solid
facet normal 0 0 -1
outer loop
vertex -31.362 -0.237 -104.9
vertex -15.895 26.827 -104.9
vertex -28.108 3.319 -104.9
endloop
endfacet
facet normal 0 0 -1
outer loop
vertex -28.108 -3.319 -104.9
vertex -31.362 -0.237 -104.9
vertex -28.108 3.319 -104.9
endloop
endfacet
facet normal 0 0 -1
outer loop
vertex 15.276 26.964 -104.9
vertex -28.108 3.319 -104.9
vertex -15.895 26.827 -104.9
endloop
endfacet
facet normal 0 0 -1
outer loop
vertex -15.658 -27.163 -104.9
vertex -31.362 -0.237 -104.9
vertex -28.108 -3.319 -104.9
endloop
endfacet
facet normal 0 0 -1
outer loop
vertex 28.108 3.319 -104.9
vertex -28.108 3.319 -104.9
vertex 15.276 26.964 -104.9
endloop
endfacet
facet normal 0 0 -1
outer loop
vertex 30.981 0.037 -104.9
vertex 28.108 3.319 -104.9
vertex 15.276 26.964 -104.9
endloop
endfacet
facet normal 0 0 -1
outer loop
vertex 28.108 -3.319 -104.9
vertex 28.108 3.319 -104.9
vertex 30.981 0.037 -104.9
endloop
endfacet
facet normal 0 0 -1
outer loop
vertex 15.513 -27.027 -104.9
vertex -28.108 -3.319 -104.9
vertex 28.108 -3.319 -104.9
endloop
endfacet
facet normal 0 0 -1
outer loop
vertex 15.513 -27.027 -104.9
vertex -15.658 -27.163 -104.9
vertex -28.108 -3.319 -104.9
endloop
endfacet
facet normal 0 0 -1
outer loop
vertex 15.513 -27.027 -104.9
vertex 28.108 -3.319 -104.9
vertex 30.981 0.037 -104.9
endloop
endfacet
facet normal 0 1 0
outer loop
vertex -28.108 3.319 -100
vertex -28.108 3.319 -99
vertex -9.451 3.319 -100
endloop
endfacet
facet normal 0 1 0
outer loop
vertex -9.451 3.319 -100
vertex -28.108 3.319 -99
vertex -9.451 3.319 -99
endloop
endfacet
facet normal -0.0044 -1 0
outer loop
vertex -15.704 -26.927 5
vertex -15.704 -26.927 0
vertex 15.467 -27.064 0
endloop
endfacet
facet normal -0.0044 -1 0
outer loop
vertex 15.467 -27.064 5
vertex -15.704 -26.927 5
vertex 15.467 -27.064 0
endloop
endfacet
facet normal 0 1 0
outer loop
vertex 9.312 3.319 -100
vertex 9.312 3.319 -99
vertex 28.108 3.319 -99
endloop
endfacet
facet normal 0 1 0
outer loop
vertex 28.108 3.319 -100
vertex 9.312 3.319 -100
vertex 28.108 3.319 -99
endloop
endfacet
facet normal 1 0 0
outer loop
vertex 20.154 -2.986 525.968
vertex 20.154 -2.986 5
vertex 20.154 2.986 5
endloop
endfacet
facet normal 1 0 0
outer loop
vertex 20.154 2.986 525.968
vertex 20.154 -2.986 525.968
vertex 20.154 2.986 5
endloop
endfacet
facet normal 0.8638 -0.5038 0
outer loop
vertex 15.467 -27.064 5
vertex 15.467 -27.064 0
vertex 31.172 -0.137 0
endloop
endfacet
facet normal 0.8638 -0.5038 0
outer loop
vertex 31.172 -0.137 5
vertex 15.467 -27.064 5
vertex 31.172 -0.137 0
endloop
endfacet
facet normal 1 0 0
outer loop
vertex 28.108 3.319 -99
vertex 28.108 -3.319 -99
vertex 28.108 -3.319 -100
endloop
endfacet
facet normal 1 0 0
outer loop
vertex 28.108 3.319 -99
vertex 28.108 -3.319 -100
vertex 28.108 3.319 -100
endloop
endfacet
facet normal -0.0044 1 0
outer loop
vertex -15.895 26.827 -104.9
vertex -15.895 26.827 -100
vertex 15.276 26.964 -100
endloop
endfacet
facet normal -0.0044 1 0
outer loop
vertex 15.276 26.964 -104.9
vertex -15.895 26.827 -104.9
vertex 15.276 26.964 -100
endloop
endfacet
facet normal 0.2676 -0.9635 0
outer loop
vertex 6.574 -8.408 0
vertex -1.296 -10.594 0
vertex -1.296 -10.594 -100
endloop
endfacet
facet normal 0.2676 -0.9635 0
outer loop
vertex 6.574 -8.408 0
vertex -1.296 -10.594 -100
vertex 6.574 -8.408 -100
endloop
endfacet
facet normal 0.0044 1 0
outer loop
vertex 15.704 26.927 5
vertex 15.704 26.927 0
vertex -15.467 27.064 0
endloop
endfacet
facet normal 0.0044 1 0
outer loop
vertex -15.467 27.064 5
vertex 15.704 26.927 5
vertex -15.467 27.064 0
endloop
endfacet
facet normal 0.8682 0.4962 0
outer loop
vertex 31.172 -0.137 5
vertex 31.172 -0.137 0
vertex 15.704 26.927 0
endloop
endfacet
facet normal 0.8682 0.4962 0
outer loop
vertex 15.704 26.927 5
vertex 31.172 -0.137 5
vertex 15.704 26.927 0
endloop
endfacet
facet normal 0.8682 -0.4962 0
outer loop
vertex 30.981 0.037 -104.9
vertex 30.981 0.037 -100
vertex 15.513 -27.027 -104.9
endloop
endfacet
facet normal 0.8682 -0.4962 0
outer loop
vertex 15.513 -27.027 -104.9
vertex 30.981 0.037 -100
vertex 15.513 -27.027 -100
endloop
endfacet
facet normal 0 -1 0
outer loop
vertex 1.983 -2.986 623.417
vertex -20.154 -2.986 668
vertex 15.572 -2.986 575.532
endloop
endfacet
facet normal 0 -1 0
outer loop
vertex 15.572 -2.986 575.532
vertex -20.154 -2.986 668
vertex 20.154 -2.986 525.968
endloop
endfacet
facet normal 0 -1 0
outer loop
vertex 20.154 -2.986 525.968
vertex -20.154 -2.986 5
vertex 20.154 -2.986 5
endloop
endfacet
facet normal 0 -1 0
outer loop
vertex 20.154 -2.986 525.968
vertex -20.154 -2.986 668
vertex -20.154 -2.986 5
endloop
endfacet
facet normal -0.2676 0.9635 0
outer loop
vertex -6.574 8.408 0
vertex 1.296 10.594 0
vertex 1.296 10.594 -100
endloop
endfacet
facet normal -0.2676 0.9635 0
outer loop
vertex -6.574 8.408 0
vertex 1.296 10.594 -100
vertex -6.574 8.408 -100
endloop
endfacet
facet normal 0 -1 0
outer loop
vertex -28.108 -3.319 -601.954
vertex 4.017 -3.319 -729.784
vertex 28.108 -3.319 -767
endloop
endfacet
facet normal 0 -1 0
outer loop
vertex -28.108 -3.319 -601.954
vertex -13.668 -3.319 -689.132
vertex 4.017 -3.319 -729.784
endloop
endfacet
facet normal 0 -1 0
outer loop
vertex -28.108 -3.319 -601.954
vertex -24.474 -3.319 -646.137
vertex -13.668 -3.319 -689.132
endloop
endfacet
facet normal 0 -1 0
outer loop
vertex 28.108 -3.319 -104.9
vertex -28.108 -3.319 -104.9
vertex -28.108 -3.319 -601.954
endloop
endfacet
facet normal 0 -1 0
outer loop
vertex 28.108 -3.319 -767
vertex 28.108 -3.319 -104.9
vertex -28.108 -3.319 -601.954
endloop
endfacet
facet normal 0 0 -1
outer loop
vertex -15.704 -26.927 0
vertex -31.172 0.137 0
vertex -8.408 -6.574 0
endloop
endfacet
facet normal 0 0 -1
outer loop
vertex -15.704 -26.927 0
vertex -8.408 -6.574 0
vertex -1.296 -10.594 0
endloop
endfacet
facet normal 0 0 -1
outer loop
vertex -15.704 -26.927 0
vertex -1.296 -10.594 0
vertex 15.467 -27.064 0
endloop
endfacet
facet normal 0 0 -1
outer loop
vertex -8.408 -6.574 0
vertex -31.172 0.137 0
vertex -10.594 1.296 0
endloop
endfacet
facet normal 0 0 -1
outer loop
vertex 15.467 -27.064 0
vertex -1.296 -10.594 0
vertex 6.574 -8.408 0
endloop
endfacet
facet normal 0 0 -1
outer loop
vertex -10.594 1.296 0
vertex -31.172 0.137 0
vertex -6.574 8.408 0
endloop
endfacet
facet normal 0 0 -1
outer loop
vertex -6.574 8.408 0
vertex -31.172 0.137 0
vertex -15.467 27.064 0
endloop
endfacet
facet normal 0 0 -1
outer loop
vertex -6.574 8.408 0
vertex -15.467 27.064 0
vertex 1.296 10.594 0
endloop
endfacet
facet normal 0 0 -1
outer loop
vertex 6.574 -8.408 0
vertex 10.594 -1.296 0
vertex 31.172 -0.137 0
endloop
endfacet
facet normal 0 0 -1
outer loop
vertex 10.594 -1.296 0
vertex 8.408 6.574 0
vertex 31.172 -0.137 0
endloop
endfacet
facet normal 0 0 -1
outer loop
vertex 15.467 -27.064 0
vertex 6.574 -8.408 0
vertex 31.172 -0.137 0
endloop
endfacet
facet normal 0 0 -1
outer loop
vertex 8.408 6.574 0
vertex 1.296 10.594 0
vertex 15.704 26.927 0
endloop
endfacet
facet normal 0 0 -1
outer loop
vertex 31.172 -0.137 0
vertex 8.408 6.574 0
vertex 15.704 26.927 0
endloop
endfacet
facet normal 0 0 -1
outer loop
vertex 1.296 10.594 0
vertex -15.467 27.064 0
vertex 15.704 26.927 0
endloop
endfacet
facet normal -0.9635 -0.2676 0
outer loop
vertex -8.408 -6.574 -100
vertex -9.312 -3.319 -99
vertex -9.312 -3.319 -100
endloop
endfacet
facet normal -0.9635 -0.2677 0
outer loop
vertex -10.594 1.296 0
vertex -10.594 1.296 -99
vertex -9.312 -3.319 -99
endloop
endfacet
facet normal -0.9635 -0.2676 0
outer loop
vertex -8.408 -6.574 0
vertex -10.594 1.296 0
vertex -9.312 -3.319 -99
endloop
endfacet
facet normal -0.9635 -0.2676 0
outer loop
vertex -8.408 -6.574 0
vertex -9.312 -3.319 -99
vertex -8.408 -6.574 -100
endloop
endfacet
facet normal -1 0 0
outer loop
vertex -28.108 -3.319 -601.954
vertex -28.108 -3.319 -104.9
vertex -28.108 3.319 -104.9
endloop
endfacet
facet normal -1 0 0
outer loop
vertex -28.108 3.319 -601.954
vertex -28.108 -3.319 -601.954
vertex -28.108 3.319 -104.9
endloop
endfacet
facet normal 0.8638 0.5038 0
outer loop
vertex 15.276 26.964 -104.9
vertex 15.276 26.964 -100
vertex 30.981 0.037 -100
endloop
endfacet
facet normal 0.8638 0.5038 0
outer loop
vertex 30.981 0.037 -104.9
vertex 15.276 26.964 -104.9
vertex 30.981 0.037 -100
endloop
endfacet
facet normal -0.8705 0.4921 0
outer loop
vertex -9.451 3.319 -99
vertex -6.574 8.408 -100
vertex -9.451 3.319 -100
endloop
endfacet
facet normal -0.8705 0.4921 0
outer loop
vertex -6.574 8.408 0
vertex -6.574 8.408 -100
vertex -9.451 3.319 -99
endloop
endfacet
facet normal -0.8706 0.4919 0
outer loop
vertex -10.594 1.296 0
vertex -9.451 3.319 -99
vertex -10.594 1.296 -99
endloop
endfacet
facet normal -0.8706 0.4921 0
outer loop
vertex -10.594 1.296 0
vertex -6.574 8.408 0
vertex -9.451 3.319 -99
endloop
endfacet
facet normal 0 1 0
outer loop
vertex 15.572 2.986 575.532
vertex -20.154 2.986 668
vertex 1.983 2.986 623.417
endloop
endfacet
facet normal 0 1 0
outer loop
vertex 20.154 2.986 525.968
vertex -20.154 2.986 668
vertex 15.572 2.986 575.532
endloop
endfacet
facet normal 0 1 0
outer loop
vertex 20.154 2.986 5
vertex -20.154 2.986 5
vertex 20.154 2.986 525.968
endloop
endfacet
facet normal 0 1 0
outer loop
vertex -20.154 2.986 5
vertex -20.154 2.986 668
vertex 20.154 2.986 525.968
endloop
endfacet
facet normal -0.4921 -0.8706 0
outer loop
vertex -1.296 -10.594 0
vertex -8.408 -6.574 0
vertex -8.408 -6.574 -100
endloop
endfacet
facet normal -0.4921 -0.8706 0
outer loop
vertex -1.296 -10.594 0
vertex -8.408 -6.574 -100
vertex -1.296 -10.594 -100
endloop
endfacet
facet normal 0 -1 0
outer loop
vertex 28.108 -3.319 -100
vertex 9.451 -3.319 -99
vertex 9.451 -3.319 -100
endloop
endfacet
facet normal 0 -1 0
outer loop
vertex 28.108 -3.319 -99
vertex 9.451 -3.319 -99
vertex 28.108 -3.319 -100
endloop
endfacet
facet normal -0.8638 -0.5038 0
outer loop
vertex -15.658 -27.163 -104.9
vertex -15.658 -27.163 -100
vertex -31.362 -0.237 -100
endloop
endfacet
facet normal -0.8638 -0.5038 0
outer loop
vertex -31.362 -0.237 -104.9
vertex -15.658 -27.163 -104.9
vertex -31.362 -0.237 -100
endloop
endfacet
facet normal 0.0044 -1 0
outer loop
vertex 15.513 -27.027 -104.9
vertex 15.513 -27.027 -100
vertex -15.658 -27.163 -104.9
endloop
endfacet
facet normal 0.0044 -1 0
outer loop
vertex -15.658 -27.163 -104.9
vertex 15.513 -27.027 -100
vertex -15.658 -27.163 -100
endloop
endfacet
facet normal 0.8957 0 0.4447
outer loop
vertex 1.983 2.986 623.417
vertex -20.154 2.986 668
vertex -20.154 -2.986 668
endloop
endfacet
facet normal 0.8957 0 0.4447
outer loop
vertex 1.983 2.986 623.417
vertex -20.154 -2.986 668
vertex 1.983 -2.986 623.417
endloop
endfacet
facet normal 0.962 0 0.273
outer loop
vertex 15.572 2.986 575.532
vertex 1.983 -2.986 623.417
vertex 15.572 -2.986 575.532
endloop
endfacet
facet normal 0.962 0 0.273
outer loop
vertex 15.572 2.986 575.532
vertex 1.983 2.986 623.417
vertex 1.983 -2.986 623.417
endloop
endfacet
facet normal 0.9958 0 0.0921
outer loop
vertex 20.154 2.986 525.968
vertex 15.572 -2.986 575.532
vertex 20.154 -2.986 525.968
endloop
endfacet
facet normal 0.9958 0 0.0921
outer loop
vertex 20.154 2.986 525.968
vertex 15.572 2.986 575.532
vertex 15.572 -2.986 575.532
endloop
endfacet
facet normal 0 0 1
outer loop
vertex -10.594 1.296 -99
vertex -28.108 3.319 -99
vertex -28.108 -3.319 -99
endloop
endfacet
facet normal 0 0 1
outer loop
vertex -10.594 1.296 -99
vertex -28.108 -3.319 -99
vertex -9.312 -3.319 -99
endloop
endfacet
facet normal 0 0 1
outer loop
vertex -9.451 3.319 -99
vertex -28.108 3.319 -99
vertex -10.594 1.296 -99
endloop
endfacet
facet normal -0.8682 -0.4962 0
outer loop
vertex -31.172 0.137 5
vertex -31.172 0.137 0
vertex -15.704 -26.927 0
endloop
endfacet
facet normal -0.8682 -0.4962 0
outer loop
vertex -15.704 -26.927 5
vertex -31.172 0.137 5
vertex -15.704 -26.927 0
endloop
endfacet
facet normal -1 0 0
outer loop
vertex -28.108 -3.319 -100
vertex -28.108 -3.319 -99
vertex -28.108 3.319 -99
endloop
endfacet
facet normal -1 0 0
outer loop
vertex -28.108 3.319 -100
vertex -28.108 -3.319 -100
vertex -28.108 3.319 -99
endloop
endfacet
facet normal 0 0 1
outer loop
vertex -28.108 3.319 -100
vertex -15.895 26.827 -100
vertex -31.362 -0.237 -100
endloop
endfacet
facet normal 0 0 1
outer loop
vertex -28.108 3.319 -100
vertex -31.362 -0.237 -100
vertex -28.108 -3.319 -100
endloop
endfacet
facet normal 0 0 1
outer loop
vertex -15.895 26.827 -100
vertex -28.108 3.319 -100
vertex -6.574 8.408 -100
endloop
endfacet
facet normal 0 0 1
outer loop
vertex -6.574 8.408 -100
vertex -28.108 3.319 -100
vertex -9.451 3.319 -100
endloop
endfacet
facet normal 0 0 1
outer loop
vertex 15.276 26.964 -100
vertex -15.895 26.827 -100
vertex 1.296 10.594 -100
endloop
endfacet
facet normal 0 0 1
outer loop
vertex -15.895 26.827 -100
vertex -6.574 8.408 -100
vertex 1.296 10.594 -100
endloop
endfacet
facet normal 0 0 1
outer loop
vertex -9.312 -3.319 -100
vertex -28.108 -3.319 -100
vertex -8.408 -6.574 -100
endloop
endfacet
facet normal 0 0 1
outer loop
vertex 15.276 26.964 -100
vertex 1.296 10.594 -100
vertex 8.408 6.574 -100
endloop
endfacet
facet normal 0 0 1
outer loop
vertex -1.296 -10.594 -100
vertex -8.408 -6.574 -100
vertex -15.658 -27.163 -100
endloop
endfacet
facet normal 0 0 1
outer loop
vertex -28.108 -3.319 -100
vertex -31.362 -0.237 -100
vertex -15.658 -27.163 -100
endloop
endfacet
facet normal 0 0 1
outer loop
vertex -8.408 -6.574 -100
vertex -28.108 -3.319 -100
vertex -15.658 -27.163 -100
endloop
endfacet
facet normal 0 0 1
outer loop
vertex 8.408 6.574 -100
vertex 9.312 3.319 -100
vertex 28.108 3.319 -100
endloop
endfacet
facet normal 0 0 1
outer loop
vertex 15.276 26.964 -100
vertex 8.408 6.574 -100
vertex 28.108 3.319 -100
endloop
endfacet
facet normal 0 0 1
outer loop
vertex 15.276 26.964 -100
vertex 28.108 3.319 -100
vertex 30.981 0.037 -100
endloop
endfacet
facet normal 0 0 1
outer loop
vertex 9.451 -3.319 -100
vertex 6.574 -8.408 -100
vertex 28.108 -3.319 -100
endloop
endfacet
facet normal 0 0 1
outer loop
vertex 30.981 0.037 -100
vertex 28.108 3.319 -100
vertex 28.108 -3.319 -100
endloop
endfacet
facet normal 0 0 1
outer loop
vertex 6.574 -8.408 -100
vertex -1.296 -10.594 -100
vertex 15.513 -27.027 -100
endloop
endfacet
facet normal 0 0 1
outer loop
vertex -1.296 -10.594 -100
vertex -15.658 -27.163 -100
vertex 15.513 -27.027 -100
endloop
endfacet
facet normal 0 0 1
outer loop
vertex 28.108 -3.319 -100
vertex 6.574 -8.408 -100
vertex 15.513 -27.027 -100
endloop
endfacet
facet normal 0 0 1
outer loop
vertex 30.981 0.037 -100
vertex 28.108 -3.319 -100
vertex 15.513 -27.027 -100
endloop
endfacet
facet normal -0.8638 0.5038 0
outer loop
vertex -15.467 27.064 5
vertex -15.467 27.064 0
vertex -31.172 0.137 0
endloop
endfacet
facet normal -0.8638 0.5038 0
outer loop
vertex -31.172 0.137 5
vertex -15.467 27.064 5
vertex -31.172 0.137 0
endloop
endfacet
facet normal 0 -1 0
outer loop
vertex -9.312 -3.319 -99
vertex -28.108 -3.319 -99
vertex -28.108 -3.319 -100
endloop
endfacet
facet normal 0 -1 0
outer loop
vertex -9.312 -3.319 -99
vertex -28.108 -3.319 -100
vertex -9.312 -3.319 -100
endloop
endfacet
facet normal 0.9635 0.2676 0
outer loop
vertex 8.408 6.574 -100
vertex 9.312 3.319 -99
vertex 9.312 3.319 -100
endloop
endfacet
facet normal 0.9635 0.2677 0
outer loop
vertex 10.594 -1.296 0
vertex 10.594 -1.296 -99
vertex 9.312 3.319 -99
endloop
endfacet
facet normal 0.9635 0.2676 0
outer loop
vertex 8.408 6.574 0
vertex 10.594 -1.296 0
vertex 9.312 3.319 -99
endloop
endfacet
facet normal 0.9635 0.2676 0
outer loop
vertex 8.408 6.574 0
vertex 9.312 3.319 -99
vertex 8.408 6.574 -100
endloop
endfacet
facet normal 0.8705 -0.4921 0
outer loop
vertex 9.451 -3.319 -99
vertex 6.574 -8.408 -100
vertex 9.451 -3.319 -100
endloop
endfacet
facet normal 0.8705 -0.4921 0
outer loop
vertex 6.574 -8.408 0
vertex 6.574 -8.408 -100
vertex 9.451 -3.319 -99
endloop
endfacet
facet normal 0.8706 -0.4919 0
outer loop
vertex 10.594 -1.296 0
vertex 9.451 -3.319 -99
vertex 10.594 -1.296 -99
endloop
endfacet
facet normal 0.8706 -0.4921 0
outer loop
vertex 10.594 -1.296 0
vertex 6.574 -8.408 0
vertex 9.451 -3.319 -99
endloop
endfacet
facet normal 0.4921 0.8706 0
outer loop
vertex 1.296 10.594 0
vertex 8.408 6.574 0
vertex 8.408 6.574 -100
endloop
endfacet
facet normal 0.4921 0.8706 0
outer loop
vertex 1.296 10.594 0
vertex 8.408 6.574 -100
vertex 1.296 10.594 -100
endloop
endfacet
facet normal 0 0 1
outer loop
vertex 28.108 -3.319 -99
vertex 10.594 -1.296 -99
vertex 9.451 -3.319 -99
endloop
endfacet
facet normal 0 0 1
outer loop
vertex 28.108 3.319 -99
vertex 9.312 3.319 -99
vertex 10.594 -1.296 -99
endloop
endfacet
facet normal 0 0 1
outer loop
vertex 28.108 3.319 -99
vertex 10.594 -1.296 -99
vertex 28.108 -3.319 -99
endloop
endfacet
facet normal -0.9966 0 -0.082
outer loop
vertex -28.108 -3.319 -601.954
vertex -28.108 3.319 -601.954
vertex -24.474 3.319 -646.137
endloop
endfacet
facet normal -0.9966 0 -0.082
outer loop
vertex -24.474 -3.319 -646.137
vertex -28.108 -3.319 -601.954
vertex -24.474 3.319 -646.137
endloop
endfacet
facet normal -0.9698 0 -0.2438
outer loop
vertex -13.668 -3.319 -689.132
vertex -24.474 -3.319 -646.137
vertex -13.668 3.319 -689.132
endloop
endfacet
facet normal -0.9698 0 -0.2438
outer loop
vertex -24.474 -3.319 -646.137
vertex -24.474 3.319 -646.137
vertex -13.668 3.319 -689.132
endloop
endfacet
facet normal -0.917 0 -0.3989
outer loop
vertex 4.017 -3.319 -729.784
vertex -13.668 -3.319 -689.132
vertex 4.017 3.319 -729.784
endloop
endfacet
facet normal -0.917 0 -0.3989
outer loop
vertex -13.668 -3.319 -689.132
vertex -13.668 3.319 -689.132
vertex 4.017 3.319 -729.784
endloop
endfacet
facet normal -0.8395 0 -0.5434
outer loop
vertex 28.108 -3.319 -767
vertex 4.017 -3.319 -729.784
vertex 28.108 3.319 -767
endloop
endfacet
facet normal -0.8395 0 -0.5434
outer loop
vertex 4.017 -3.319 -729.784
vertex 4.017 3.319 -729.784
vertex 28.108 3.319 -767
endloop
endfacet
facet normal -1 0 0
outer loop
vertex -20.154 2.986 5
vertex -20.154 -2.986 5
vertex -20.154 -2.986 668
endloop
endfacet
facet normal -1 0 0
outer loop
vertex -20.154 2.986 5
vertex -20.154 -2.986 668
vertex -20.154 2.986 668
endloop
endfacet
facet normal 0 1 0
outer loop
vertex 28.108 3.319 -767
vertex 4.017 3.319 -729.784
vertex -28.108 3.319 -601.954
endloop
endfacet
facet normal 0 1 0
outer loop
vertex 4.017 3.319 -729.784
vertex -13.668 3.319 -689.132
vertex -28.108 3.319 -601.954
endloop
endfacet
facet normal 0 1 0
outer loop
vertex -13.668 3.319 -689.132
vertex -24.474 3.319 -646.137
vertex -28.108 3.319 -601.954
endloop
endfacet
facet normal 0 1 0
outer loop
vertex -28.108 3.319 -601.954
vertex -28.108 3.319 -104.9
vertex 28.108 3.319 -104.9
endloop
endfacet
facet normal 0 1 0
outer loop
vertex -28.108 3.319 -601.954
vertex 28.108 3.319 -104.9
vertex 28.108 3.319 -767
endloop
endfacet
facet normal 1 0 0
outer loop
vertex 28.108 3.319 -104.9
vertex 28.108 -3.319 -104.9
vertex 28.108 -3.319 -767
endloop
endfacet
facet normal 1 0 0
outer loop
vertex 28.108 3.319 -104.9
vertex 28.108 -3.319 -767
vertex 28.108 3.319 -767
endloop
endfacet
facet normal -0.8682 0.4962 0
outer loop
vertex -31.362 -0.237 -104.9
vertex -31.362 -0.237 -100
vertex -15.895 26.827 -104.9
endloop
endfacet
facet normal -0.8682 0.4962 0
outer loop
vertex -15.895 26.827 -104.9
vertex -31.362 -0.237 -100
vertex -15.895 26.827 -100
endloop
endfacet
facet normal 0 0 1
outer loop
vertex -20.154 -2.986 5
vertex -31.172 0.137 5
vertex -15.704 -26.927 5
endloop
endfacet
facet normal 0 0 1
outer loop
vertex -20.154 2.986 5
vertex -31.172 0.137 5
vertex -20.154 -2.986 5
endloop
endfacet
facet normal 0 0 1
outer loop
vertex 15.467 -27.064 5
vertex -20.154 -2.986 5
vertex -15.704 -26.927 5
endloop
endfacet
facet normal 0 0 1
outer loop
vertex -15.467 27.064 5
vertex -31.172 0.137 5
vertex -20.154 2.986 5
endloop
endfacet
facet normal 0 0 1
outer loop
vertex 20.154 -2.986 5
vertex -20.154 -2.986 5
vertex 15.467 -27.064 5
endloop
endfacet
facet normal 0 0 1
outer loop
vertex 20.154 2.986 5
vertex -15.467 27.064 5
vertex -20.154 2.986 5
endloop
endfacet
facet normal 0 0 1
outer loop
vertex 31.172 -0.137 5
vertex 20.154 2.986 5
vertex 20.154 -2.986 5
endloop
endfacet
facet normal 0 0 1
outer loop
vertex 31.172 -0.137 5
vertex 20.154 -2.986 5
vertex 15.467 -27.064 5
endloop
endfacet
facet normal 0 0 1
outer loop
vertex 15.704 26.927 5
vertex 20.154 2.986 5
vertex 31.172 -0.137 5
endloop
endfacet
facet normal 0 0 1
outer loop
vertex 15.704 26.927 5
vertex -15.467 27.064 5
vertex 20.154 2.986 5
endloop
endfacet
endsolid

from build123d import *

# Parameters (mm, degrees)
F0_W         = 40.3080582619
F0_H         = 5.9715644456
F1_DEPTH     = 668
F3_DEPTH     = 100
F5_DEPTH     = 5
F6_T1_DEPTH  = 716.1336390313
F9_DEPTH     = 4.9
F10_W        = 56.2156327069
F10_H        = 6.6376542673
F11_DEPTH    = 668
F12_T1_DEPTH = 831.8697028016


# Not quite as in the source:
# - a fillet or chamfer that OpenCascade refuses, or shapes differently, is made with other operations: its cross-section is extruded or revolved along the edge and cut away or added


with BuildPart() as f1:
    # F0 (on Top) → F1 (new body)
    with BuildSketch(Plane.XY):
        Rectangle(F0_W, F0_H)
    extrude(amount=F1_DEPTH)

    # F2 (on Top) → F3 (join)
    with BuildSketch(Plane.XY):
        Polygon((6.5744029718, -8.407556447), (10.5938451005, -1.2962352533), (8.407556447, 6.5744029718), (1.2962352533, 10.5938451005), (-6.5744029718, 8.407556447), (-10.5938451005, 1.2962352533), (-8.407556447, -6.5744029718), (-1.2962352533, -10.5938451005), align=None)
    extrude(amount=-F3_DEPTH)

    # F4 (on Top) → F5 (join)
    with BuildSketch(Plane.XY):
        Polygon((31.1715127681, -0.1368859226), (15.7043030704, 26.9268789703), (-15.4672096977, 27.0637648929), (-31.1715127681, 0.1368859226), (-15.7043030704, -26.9268789703), (15.4672096977, -27.0637648929), align=None)
    extrude(amount=F5_DEPTH)

    # F6: fillet of radius 270.3919189858 on 1 edges, made by hand

    # F6_s2 → F6_t1 (cut)
    with BuildSketch(Plane.XZ.offset(-358.0668195157)):
        with BuildLine():
            ThreePointArc((-20.1540291309, 668), (9.881896476, 599.7882231999), (20.1540291309, 525.9675850829))
            Line((20.1540291309, 525.9675850829), (20.1540291309, 668))
            Line((20.1540291309, 668), (-20.1540291309, 668))
        make_face()
    extrude(amount=F6_T1_DEPTH, mode=Mode.SUBTRACT)

    # F8 (on face) → F9 (join)
    with BuildSketch(Plane(origin=(0, 0, -100), x_dir=(1, 0, 0), z_dir=(0, 0, -1))):
        Polygon((30.9805478901, -0.0372380018), (15.5133381924, 27.0265268911), (-15.6581745757, 27.1634128136), (-31.3624776462, 0.2365338433), (-15.8952679485, -26.8272310495), (15.2762448196, -26.9641169721), align=None)
    extrude(amount=F9_DEPTH)

    # F10 (on offset) → F11 (join)
    with BuildSketch(Plane.XY.offset(-99)):
        Rectangle(F10_W, F10_H)
    extrude(amount=-F11_DEPTH)

    # F12: fillet of radius 270.392 on 1 edges, made by hand

    # F12_s2 → F12_t1 (cut)
    with BuildSketch(Plane.XZ.offset(-415.9348514008)):
        with BuildLine():
            ThreePointArc((-28.1078163534, -601.9535902931), (-13.6683607529, -689.132307188), (28.1078163534, -767))
            Line((28.1078163534, -767), (-28.1078163534, -767))
            Line((-28.1078163534, -767), (-28.1078163534, -601.9535902931))
        make_face()
    extrude(amount=F12_T1_DEPTH, mode=Mode.SUBTRACT)


solid = f1.part
